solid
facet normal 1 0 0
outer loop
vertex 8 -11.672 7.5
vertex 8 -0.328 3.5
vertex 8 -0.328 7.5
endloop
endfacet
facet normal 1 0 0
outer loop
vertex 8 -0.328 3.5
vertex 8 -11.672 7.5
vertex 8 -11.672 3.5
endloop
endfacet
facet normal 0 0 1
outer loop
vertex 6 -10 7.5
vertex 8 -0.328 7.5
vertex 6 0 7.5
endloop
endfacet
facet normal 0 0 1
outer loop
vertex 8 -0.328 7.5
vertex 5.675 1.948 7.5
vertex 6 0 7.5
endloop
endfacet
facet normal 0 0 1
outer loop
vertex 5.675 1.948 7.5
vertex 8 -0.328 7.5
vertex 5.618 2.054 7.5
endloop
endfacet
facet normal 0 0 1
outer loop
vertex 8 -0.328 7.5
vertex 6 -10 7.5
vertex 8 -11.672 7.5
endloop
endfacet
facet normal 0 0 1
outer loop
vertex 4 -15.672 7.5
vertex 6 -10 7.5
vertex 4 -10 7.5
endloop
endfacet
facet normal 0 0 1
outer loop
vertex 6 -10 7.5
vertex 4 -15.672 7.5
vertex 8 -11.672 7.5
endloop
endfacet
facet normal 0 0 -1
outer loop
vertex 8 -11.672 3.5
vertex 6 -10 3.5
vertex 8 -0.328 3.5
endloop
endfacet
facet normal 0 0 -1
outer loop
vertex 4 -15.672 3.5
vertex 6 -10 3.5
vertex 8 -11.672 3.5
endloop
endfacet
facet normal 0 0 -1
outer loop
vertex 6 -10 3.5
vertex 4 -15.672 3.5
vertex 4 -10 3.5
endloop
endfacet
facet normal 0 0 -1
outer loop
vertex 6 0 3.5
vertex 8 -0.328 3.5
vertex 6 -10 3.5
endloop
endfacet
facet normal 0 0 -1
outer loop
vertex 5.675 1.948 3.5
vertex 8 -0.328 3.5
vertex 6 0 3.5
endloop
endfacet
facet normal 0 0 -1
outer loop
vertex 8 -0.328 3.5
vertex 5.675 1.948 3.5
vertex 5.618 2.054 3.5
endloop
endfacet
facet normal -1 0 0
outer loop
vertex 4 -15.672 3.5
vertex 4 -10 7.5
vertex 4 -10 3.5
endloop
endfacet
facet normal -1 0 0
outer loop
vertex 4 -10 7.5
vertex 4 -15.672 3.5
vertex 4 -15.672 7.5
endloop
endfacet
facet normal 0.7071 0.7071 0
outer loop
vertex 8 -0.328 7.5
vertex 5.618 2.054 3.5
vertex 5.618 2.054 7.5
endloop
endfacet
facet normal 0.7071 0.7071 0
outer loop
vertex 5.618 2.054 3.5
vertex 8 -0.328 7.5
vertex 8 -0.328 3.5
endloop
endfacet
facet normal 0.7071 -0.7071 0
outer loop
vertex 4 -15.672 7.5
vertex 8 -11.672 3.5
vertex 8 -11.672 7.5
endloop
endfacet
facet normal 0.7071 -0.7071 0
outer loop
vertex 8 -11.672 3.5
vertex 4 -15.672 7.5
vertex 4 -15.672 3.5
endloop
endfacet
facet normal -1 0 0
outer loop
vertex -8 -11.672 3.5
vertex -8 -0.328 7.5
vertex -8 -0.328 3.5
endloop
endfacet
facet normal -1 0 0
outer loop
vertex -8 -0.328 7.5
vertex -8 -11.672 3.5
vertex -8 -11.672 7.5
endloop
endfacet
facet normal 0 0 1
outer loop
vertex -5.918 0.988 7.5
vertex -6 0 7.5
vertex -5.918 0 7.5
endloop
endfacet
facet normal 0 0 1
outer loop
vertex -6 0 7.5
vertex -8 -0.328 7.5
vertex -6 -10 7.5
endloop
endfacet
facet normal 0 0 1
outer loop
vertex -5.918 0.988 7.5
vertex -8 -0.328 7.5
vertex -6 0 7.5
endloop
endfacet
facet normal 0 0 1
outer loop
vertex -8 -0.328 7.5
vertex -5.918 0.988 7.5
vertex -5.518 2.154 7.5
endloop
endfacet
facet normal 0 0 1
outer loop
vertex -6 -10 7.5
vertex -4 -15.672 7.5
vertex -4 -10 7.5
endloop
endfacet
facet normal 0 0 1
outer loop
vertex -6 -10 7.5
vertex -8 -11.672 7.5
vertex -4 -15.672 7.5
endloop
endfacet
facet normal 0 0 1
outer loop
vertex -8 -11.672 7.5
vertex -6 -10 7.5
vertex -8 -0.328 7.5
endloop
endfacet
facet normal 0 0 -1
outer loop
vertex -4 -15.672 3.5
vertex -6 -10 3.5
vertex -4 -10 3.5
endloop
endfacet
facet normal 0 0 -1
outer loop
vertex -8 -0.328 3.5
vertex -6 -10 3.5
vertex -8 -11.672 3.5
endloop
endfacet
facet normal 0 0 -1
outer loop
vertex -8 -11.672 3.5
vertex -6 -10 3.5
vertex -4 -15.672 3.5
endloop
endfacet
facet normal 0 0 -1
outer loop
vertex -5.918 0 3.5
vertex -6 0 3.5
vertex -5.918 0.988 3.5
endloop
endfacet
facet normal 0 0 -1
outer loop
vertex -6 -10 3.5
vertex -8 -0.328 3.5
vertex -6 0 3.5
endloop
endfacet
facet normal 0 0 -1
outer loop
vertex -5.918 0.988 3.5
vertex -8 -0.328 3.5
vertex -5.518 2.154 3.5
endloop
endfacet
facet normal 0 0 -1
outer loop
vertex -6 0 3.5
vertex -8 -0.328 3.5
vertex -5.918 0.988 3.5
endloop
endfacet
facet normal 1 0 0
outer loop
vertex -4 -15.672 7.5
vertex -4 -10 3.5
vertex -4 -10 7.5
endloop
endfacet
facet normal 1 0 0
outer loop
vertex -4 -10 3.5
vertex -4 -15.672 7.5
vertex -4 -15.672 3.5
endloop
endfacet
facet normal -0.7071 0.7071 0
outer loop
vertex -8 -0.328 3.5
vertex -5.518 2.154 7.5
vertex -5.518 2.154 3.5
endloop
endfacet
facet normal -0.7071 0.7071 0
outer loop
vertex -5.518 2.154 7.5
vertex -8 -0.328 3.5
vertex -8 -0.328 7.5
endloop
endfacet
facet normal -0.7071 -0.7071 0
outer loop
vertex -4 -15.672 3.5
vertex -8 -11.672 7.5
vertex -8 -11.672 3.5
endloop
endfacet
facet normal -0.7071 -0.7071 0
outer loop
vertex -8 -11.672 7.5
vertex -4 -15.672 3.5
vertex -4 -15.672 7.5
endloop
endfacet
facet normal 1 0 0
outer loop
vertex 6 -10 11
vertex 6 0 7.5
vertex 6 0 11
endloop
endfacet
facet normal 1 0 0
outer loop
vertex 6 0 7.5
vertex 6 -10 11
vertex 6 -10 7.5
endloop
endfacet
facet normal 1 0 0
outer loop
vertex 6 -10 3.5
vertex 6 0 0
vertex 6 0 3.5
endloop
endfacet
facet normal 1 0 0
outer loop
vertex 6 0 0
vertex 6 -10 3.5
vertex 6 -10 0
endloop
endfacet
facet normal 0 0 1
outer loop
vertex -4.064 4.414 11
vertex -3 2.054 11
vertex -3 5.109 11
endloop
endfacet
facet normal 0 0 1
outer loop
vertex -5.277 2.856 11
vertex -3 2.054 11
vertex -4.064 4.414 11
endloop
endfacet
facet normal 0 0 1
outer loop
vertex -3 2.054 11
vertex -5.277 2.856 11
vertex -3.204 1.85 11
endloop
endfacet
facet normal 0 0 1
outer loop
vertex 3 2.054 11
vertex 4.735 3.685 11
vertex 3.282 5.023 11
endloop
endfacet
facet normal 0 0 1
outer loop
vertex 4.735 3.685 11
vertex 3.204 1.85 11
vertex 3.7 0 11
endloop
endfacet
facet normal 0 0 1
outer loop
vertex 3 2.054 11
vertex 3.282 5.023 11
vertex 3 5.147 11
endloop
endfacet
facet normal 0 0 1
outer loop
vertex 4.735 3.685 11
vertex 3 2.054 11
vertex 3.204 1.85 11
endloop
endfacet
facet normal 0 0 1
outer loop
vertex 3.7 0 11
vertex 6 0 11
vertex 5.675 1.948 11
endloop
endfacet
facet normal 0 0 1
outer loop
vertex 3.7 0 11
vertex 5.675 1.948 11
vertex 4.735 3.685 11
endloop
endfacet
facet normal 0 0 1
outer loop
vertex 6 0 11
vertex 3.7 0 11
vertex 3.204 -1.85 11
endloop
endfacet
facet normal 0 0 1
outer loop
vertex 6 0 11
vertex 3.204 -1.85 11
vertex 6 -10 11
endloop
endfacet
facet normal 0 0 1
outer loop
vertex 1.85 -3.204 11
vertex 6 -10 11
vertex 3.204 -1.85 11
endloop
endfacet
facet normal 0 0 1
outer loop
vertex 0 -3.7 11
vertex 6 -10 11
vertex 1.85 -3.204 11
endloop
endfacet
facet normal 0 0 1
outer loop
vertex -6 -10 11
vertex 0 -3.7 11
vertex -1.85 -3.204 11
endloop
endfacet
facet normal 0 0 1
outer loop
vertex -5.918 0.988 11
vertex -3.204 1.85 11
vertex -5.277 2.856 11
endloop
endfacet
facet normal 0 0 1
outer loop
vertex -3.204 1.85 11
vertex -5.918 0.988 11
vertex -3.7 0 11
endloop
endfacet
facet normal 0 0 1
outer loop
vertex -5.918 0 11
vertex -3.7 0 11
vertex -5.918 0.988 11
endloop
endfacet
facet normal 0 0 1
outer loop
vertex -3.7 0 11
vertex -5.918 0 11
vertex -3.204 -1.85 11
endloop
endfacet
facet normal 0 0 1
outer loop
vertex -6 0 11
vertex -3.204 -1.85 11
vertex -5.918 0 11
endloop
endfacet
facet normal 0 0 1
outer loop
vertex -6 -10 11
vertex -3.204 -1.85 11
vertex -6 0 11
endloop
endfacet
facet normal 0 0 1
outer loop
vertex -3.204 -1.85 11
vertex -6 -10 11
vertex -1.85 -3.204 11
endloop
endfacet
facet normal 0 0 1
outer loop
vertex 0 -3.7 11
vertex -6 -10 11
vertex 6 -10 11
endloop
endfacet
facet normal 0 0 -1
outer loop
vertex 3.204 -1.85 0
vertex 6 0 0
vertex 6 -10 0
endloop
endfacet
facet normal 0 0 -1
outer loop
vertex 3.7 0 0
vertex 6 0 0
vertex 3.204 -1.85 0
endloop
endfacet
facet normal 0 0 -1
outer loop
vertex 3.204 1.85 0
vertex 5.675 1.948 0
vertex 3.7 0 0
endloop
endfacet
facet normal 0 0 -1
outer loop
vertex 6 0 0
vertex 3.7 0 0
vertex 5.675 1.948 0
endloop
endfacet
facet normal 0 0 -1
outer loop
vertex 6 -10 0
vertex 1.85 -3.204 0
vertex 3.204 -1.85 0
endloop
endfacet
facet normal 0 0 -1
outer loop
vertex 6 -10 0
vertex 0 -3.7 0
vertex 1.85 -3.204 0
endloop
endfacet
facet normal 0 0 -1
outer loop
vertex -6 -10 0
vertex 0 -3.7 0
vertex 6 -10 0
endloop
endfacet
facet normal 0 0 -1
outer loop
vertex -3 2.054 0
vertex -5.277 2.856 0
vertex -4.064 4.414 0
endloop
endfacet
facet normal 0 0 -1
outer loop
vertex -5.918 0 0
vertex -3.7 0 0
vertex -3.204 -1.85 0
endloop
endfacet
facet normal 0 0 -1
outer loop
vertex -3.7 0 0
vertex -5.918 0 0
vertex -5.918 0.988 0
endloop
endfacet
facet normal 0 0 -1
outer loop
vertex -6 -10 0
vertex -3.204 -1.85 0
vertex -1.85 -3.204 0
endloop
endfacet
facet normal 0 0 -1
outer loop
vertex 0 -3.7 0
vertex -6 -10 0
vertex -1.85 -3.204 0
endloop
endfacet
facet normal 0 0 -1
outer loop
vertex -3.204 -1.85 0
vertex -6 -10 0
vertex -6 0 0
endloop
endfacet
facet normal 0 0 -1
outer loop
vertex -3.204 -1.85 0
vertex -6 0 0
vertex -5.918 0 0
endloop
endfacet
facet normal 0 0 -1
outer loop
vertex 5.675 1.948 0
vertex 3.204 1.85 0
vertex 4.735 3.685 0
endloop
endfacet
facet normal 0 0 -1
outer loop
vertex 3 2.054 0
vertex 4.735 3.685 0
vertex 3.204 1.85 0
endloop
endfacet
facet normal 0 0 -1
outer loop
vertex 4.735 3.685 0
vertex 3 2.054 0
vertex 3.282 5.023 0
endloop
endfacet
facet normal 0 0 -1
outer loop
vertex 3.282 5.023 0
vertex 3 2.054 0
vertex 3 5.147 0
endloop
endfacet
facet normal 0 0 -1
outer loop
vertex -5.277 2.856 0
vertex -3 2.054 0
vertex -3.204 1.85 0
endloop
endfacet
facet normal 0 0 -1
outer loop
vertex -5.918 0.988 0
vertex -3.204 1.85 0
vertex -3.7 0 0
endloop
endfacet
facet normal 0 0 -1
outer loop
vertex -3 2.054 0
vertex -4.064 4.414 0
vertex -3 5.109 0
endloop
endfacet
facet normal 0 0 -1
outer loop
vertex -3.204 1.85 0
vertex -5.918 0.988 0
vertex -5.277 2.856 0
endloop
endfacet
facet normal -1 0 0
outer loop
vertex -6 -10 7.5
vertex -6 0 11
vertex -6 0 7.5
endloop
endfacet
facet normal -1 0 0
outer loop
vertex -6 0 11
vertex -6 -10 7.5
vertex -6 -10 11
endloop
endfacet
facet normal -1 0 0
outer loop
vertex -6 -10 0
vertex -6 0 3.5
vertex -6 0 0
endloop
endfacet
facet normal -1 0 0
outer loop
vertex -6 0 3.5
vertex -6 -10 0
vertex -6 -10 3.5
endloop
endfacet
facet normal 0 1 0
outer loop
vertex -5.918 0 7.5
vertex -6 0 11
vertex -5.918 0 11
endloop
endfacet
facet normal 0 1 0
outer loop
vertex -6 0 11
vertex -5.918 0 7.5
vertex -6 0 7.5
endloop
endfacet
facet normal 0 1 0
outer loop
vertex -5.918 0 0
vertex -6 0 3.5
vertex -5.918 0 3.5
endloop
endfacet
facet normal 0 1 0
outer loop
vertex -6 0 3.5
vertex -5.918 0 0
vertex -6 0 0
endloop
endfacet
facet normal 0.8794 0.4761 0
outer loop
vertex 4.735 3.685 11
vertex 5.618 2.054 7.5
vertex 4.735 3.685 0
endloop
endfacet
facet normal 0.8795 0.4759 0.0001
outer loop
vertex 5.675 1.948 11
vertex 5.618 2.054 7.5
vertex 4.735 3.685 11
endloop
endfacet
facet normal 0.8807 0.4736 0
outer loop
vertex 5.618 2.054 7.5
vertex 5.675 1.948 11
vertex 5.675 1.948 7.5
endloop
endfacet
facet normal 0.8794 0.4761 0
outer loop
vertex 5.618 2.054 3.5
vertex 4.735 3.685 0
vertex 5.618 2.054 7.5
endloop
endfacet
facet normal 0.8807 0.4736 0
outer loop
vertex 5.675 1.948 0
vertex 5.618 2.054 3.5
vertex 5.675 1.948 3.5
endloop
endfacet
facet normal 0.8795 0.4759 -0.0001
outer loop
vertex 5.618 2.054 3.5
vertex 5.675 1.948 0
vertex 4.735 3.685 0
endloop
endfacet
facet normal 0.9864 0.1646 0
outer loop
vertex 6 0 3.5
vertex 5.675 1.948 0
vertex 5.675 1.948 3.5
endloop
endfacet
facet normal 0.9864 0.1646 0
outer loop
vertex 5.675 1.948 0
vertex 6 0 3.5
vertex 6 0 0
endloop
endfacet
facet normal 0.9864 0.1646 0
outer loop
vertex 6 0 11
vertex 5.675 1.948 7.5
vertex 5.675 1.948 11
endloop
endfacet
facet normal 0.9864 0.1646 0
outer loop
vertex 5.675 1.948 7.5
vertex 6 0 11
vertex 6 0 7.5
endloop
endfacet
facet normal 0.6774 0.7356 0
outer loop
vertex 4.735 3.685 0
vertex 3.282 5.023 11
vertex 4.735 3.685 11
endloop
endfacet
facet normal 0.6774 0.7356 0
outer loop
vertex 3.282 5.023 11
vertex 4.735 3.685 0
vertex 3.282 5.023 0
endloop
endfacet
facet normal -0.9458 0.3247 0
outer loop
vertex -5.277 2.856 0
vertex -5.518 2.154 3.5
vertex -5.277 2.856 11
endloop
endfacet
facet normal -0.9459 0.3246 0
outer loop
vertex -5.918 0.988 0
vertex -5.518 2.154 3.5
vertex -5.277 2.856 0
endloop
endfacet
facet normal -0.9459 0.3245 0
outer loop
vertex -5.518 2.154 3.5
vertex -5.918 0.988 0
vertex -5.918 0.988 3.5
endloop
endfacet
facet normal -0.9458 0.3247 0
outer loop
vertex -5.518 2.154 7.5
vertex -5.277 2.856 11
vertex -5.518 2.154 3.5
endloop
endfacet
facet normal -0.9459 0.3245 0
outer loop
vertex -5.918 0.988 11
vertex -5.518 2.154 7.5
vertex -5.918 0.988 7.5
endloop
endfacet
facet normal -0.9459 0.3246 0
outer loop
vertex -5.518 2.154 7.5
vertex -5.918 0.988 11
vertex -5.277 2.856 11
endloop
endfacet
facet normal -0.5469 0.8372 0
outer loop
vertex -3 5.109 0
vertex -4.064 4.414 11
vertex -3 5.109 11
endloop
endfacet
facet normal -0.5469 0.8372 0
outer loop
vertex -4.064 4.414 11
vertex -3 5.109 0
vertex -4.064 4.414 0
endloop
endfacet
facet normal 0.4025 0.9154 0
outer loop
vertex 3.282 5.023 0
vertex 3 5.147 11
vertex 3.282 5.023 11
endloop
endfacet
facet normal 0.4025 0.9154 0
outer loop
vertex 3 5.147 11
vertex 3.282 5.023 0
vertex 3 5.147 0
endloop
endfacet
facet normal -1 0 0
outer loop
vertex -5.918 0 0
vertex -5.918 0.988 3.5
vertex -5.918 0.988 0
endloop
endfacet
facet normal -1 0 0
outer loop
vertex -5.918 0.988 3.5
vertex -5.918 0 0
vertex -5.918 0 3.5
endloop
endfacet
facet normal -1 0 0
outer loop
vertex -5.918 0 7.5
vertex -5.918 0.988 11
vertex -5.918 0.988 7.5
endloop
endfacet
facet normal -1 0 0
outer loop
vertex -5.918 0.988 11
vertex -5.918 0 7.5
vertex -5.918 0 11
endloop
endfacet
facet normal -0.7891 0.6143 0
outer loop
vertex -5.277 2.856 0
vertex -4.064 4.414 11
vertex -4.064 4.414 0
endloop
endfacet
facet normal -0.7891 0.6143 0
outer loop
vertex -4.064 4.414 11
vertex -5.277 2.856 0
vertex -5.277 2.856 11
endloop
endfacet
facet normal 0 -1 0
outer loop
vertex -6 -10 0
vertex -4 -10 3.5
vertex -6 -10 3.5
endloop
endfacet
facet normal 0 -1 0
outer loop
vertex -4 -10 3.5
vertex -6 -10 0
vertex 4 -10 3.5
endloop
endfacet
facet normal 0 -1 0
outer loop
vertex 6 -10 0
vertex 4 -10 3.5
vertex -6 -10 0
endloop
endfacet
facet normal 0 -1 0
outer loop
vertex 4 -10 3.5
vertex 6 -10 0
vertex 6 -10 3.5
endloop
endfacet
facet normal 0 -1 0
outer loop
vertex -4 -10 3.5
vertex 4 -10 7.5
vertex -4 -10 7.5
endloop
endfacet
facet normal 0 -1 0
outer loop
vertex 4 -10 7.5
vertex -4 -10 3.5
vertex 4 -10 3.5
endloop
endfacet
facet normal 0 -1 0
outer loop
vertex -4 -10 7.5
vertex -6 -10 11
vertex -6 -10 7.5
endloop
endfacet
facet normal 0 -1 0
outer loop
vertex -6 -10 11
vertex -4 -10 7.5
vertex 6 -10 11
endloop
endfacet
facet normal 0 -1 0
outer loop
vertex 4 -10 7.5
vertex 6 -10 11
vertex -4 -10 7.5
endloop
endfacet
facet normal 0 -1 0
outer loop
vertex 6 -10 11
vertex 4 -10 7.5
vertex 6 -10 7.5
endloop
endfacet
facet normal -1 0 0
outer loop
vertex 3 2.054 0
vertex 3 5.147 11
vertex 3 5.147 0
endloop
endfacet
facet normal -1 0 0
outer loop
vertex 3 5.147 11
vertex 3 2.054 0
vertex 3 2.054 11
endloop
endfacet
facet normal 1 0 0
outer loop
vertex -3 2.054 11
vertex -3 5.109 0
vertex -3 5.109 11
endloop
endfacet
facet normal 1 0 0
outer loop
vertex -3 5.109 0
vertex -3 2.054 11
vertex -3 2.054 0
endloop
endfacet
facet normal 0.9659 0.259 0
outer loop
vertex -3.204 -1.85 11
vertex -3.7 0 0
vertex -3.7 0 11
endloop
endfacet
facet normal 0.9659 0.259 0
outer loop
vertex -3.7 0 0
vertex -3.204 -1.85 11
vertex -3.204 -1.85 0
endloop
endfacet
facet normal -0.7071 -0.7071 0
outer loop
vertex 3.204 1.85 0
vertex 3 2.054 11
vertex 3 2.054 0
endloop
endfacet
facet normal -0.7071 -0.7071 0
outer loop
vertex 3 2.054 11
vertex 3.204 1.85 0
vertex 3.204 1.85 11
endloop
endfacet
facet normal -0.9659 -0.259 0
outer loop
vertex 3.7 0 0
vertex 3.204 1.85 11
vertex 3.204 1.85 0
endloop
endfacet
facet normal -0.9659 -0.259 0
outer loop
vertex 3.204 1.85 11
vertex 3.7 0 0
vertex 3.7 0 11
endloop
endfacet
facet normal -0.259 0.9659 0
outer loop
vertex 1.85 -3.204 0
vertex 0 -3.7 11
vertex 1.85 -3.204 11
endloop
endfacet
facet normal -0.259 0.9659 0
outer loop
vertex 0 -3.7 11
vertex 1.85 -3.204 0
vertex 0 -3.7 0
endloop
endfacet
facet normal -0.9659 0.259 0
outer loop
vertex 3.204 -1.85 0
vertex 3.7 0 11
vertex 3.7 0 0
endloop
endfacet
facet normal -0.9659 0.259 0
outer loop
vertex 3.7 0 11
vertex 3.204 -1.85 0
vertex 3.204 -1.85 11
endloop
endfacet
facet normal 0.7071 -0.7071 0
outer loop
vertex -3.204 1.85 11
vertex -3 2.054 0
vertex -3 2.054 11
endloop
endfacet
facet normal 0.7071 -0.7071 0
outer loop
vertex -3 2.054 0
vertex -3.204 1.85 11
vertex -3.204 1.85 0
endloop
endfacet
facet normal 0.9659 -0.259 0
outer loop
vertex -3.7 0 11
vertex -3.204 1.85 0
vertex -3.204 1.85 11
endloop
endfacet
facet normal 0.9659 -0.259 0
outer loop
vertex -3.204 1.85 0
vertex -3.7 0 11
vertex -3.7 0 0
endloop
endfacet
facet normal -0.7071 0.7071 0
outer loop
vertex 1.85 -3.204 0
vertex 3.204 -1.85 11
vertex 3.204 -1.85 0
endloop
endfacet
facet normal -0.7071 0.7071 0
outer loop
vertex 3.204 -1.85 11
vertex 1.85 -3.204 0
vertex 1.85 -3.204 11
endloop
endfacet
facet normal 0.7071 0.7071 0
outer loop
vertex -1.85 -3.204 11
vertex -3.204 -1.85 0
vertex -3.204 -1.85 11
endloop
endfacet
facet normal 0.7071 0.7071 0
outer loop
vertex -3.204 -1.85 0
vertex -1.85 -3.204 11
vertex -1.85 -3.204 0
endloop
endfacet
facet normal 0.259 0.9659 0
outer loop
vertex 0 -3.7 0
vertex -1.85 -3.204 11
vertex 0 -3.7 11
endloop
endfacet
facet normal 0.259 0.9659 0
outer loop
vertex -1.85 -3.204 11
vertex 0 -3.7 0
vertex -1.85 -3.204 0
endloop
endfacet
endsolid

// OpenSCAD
// file: parameters.scad
// Parameters file for RepRap Huxley

pi=3.14159265;

// The relative location in your file system where the .dxf files are
// DXFs are for quick development.  They should be replaced by parameterised CSG in dure course.

fileroot="DXF-files/";

rodsize = 6;	//threaded/smooth rod diameter in mm
xaxis = 182.5;	//width of base in mm
yaxis = 266.5;	//length of base in mm


screwsize = 3;	//bearing bore/screw diameter in mm
bearingsize = 10;	//outer diameter of bearings in mm
bearingwidth = 4;	//width of bearings in mm


rodpitch = rodsize / 6;
rodnutsize = 0.8 * rodsize; //4.8
rodwashersize = 0.2 * rodsize; //1.2
rodwasherdiameter = 2 * rodsize;//12
screwpitch = screwsize / 6;
nutsize = 0.8 * screwsize;
nutdiameter = 1.9 * screwsize;
washersize = 0.2 * screwsize;
washerdiameter = 2 * screwsize;
partthick = 2 * (rodsize+1); //12
vertexrodspace = 2 * rodsize; //12


c = [0.3, 0.3, 0.3];
rodendoffset = rodnutsize + rodwashersize * 2 + partthick / 2;//13.2
vertexoffset = vertexrodspace + rodendoffset;//25.2
//vertexoffset = 22;

renderrodthreads = false;
renderscrewthreads = false;
fn = 36;

// The gap between the joining rods at a vertex

vertex_radius=sqrt(rodsize*rodsize + vertexoffset*vertexoffset);
vertex_ang = atan(vertexoffset/rodsize)-30;
vertex_gap = 2*vertex_radius*cos(vertex_ang);

// Nema 14 dimensions - these are absolute

nema14_square=35.3;
nema14_screws=26;
nema14_screw_r=1.5;
nema14_hub=22;
nema14_hub_depth=2;
nema14_length=36;
nema14_shaft=5;
nema14_shaft_length=66;
nema14_shaft_projection=19;

// Nema 11 dimensions - these are absolute

nema11_square=28.5;
nema11_screws=23;
nema11_screw_r=1.25;
nema11_hub=22;
nema11_hub_depth=2;
nema11_length=44.5;
nema11_shaft=5;
nema11_shaft_length=78;
nema11_shaft_projection=18;

// Limit switch parameters

limit_switch_hole_diameter=2.5;
limit_switch_centres=9.5;

// The RepRap slide bearings

bearing_mount_centres=18;
bearing_width=7;

// X axis parameters - many should be relative

x_bar_gap=30;
motor_center_y = 26;
bar_clamp_x=5;
bar_clamp_y=8;
bar_clamp_x_gap=23;
bearing_y=50;
bearing_x=bar_clamp_x_gap + 10;
hole_land=4;
thickness=5;
bearing_low_z = 8;
bearing_z_gap = 25;
bearing_plate_width = bearing_mount_centres+2*hole_land + 10;
bearing_plate_overlap=0.5;
bearing_plate_support=10;
// file: configuration.scad
// eMAKEr Huxley
// Configuration file
// GNU GPL v3
// Jean-Marc Giacalone
// info@emakershop.com
// www.emakershop.com
// http://www.reprap.org/wiki/EMAKER_Huxley
// http://github.com/jmgiacalone/eMAKERHuxley

use <library.scad>

//Round corner diameter
round_corner_diameter = 8;

//Thin wall size
layer_height = 0.4;
perimeter_width_over_thicknes = 1.6;
infill_widht_over_thickness = 1.55;
thin_wall = 2*(perimeter_width_over_thicknes*layer_height+infill_widht_over_thickness*layer_height);
if(thin_wall<2){
	echo("Check thin wall size, its below 2mm!");
}
echo(thin_wall);

// MINI-HUXLEY VERSION (TODO, just place holder)
// include <configuration-huxley.scad>
m8_diameter=8.3;
m5_diameter=5.3;
m4_diameter=4.3;
m3_diameter=3.3;
m3_dia_clr=3.5;
m3_nut = 2.8;
m3_af = 5.8;
m6_diameter = 6;
m6_nut = 11.5;
bushing_diameter = 8;
motor_shaft=5.3;
bushing_rodsize = 6;
bushing_outerDiameter = 12;
bushing_lenght = 8;

// Some basic functions, probably should be somewhere else
// main file
// PRUSA Mendel 
// Bushings
// GNU GPL v2
// Josef Průša
// josefprusa@me.com
// prusadjs.cz
// http://www.reprap.org/wiki/Prusa_Mendel
// http://github.com/prusajr/PrusaMendel
// Ribs added by Adrian 12/9/11
include <configuration.scad>
/**
* @name Bushing
* @category Printed
* @link bushing
*/ 
rodsize = 7.2+0.2;
outerDiameter = bushing_outerDiameter;
lenght = bushing_lenght;
//type = bushing_type;
cutoutWidth=1.2;
rib_width=lenght-4;

module bushing(stiff=true, ribs=true, lenght=10){
difference(){
	union(){
		translate([outerDiameter/2, -6,(lenght)/2 ]) 
		rib();
		translate([-(outerDiameter/2), -6,(lenght)/2 ]) 
		mirror([1,0,0])
			rib();
		translate(v=[-outerDiameter/2,-8,0]) cube(size = [outerDiameter,8,lenght]);
		cylinder(h = lenght, r=outerDiameter/2);
		translate(v=[-outerDiameter/2,-10,0]) cube(size = [outerDiameter,3,lenght]);
	}
	translate(v=[0,5,(lenght+2)/2]) cube(size = [outerDiameter/2,8,lenght+2], center=true);
	translate(v=[0,0,-1]) cylinder(h = lenght+2, r=(rodsize)/2);
}
}


module rib(){
difference(){
	cube([4,20,rib_width], center=true);
	translate([0,10.5,0])
		rotate([0,0,45])
			cube([4,16,rib_width+2], center=true);
	translate([0,-10.5,0])
		rotate([0,0,-45])
			cube([4,16,rib_width+2], center=true);
	}
}
bushing(true, true, 11);
